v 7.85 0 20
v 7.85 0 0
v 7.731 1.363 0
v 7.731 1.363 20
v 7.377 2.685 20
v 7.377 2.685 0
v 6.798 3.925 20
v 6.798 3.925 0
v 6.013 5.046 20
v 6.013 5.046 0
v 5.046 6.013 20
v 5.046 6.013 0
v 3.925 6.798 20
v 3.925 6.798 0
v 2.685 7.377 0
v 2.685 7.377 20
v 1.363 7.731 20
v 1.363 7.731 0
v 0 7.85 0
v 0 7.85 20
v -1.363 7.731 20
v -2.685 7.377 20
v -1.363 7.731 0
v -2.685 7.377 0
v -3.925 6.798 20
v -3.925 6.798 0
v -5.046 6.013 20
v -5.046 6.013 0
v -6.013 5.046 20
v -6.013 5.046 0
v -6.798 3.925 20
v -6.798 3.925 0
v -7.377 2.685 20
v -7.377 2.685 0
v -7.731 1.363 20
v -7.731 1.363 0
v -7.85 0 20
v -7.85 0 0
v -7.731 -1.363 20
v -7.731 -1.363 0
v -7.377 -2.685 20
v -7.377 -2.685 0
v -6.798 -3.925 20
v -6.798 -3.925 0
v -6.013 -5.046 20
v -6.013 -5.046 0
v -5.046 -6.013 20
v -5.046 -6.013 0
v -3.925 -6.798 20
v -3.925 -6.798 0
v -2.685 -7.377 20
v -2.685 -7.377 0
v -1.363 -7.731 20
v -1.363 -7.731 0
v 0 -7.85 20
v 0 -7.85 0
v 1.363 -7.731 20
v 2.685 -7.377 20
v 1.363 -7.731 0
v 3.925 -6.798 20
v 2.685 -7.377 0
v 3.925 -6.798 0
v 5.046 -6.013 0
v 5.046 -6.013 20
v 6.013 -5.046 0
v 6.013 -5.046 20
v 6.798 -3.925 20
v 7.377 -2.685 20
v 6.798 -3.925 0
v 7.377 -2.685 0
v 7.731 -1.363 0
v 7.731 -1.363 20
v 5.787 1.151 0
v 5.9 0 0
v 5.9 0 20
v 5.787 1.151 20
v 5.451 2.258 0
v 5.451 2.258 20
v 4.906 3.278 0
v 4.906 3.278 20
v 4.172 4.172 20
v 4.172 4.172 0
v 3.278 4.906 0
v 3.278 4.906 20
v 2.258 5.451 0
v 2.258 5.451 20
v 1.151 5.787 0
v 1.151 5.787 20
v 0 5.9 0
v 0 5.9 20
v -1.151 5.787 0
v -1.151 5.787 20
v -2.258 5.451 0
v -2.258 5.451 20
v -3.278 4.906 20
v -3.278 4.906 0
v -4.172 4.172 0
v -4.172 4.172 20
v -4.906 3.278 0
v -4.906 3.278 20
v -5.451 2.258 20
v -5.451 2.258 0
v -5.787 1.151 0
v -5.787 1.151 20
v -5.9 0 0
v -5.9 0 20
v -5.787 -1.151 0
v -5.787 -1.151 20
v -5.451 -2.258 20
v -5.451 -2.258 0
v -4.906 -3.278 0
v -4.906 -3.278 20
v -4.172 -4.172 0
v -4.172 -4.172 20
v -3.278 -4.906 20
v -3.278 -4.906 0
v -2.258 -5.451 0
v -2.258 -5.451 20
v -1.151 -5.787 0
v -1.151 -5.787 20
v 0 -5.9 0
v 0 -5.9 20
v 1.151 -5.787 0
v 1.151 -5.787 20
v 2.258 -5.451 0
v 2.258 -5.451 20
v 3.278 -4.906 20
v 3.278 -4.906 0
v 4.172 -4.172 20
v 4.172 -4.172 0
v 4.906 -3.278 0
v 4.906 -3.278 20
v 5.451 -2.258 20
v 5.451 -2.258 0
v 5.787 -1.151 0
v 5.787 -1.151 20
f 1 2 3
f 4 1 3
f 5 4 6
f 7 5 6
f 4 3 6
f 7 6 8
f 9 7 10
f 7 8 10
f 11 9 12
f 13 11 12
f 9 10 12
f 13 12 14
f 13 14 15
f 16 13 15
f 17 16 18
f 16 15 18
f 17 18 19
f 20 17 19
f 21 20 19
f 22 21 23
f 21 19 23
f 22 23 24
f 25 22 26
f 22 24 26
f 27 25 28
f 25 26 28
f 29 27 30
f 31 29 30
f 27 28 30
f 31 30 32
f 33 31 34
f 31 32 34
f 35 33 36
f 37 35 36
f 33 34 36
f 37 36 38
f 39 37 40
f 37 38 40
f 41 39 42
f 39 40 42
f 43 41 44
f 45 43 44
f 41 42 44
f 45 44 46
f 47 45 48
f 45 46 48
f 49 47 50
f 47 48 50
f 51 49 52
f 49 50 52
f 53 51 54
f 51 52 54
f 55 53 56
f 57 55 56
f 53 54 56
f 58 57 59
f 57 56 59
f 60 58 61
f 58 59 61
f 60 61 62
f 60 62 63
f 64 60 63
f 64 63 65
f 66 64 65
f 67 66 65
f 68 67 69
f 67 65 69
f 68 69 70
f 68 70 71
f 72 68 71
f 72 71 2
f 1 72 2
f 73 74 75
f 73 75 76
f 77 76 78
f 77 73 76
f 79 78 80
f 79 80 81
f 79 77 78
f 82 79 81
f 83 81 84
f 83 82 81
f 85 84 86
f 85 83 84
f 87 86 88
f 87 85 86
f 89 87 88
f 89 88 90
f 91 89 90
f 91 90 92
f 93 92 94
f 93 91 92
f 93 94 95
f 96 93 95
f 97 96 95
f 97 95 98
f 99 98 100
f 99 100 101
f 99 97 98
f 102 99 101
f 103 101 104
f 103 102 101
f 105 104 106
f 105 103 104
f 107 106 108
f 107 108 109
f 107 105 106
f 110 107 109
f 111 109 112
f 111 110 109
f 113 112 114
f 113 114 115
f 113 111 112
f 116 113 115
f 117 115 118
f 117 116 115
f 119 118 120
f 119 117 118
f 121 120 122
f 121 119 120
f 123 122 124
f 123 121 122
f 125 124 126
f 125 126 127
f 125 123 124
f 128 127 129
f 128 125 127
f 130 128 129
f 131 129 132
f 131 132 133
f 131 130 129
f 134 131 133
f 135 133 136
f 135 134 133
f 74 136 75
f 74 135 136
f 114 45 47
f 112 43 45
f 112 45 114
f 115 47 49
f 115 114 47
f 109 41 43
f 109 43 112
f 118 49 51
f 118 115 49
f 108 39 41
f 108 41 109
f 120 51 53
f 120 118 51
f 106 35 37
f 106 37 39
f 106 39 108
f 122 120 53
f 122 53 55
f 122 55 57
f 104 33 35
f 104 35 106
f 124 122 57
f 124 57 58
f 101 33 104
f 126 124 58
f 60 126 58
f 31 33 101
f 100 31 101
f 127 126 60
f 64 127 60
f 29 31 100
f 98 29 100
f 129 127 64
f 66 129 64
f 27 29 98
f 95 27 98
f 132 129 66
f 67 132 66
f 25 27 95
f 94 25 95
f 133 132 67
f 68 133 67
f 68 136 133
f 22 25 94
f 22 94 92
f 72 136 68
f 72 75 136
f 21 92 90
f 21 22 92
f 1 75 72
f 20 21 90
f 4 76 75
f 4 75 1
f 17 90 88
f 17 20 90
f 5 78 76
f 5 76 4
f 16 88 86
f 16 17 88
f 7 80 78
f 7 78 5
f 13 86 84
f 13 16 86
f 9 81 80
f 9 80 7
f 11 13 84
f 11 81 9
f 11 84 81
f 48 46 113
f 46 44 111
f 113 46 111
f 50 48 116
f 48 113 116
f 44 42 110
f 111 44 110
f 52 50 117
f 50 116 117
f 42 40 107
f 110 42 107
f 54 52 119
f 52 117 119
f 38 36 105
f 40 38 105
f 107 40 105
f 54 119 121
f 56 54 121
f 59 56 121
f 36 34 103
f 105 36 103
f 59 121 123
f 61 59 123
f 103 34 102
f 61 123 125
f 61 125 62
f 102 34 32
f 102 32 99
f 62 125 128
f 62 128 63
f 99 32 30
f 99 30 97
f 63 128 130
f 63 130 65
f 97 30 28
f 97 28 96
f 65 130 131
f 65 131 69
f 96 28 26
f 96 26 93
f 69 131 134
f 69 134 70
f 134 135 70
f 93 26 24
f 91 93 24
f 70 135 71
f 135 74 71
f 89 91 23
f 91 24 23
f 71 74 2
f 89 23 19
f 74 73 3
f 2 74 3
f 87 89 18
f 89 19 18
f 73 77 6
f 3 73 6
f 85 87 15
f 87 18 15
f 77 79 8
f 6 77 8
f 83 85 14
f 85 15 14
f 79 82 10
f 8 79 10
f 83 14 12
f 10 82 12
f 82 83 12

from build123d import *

# Parameters (mm, degrees)
CYLINDER_R        = 5.9
CYLINDER_DEPTH    = 20
CYLINDER001_R     = 7.85
CYLINDER001_DEPTH = 20


with BuildPart() as cylinder:
    # Cylinder → Cylinder (new body)
    with BuildSketch(Plane.XY):
        Circle(CYLINDER_R)
    extrude(amount=CYLINDER_DEPTH)


with BuildPart() as wheel_spacer:
    # Cylinder001 → Cylinder001 (new body)
    with BuildSketch(Plane.XY):
        Circle(CYLINDER001_R)
    extrude(amount=CYLINDER001_DEPTH)

    # Cut: cut Cylinder
    add(cylinder.part, mode=Mode.SUBTRACT)


solid = wheel_spacer.part
